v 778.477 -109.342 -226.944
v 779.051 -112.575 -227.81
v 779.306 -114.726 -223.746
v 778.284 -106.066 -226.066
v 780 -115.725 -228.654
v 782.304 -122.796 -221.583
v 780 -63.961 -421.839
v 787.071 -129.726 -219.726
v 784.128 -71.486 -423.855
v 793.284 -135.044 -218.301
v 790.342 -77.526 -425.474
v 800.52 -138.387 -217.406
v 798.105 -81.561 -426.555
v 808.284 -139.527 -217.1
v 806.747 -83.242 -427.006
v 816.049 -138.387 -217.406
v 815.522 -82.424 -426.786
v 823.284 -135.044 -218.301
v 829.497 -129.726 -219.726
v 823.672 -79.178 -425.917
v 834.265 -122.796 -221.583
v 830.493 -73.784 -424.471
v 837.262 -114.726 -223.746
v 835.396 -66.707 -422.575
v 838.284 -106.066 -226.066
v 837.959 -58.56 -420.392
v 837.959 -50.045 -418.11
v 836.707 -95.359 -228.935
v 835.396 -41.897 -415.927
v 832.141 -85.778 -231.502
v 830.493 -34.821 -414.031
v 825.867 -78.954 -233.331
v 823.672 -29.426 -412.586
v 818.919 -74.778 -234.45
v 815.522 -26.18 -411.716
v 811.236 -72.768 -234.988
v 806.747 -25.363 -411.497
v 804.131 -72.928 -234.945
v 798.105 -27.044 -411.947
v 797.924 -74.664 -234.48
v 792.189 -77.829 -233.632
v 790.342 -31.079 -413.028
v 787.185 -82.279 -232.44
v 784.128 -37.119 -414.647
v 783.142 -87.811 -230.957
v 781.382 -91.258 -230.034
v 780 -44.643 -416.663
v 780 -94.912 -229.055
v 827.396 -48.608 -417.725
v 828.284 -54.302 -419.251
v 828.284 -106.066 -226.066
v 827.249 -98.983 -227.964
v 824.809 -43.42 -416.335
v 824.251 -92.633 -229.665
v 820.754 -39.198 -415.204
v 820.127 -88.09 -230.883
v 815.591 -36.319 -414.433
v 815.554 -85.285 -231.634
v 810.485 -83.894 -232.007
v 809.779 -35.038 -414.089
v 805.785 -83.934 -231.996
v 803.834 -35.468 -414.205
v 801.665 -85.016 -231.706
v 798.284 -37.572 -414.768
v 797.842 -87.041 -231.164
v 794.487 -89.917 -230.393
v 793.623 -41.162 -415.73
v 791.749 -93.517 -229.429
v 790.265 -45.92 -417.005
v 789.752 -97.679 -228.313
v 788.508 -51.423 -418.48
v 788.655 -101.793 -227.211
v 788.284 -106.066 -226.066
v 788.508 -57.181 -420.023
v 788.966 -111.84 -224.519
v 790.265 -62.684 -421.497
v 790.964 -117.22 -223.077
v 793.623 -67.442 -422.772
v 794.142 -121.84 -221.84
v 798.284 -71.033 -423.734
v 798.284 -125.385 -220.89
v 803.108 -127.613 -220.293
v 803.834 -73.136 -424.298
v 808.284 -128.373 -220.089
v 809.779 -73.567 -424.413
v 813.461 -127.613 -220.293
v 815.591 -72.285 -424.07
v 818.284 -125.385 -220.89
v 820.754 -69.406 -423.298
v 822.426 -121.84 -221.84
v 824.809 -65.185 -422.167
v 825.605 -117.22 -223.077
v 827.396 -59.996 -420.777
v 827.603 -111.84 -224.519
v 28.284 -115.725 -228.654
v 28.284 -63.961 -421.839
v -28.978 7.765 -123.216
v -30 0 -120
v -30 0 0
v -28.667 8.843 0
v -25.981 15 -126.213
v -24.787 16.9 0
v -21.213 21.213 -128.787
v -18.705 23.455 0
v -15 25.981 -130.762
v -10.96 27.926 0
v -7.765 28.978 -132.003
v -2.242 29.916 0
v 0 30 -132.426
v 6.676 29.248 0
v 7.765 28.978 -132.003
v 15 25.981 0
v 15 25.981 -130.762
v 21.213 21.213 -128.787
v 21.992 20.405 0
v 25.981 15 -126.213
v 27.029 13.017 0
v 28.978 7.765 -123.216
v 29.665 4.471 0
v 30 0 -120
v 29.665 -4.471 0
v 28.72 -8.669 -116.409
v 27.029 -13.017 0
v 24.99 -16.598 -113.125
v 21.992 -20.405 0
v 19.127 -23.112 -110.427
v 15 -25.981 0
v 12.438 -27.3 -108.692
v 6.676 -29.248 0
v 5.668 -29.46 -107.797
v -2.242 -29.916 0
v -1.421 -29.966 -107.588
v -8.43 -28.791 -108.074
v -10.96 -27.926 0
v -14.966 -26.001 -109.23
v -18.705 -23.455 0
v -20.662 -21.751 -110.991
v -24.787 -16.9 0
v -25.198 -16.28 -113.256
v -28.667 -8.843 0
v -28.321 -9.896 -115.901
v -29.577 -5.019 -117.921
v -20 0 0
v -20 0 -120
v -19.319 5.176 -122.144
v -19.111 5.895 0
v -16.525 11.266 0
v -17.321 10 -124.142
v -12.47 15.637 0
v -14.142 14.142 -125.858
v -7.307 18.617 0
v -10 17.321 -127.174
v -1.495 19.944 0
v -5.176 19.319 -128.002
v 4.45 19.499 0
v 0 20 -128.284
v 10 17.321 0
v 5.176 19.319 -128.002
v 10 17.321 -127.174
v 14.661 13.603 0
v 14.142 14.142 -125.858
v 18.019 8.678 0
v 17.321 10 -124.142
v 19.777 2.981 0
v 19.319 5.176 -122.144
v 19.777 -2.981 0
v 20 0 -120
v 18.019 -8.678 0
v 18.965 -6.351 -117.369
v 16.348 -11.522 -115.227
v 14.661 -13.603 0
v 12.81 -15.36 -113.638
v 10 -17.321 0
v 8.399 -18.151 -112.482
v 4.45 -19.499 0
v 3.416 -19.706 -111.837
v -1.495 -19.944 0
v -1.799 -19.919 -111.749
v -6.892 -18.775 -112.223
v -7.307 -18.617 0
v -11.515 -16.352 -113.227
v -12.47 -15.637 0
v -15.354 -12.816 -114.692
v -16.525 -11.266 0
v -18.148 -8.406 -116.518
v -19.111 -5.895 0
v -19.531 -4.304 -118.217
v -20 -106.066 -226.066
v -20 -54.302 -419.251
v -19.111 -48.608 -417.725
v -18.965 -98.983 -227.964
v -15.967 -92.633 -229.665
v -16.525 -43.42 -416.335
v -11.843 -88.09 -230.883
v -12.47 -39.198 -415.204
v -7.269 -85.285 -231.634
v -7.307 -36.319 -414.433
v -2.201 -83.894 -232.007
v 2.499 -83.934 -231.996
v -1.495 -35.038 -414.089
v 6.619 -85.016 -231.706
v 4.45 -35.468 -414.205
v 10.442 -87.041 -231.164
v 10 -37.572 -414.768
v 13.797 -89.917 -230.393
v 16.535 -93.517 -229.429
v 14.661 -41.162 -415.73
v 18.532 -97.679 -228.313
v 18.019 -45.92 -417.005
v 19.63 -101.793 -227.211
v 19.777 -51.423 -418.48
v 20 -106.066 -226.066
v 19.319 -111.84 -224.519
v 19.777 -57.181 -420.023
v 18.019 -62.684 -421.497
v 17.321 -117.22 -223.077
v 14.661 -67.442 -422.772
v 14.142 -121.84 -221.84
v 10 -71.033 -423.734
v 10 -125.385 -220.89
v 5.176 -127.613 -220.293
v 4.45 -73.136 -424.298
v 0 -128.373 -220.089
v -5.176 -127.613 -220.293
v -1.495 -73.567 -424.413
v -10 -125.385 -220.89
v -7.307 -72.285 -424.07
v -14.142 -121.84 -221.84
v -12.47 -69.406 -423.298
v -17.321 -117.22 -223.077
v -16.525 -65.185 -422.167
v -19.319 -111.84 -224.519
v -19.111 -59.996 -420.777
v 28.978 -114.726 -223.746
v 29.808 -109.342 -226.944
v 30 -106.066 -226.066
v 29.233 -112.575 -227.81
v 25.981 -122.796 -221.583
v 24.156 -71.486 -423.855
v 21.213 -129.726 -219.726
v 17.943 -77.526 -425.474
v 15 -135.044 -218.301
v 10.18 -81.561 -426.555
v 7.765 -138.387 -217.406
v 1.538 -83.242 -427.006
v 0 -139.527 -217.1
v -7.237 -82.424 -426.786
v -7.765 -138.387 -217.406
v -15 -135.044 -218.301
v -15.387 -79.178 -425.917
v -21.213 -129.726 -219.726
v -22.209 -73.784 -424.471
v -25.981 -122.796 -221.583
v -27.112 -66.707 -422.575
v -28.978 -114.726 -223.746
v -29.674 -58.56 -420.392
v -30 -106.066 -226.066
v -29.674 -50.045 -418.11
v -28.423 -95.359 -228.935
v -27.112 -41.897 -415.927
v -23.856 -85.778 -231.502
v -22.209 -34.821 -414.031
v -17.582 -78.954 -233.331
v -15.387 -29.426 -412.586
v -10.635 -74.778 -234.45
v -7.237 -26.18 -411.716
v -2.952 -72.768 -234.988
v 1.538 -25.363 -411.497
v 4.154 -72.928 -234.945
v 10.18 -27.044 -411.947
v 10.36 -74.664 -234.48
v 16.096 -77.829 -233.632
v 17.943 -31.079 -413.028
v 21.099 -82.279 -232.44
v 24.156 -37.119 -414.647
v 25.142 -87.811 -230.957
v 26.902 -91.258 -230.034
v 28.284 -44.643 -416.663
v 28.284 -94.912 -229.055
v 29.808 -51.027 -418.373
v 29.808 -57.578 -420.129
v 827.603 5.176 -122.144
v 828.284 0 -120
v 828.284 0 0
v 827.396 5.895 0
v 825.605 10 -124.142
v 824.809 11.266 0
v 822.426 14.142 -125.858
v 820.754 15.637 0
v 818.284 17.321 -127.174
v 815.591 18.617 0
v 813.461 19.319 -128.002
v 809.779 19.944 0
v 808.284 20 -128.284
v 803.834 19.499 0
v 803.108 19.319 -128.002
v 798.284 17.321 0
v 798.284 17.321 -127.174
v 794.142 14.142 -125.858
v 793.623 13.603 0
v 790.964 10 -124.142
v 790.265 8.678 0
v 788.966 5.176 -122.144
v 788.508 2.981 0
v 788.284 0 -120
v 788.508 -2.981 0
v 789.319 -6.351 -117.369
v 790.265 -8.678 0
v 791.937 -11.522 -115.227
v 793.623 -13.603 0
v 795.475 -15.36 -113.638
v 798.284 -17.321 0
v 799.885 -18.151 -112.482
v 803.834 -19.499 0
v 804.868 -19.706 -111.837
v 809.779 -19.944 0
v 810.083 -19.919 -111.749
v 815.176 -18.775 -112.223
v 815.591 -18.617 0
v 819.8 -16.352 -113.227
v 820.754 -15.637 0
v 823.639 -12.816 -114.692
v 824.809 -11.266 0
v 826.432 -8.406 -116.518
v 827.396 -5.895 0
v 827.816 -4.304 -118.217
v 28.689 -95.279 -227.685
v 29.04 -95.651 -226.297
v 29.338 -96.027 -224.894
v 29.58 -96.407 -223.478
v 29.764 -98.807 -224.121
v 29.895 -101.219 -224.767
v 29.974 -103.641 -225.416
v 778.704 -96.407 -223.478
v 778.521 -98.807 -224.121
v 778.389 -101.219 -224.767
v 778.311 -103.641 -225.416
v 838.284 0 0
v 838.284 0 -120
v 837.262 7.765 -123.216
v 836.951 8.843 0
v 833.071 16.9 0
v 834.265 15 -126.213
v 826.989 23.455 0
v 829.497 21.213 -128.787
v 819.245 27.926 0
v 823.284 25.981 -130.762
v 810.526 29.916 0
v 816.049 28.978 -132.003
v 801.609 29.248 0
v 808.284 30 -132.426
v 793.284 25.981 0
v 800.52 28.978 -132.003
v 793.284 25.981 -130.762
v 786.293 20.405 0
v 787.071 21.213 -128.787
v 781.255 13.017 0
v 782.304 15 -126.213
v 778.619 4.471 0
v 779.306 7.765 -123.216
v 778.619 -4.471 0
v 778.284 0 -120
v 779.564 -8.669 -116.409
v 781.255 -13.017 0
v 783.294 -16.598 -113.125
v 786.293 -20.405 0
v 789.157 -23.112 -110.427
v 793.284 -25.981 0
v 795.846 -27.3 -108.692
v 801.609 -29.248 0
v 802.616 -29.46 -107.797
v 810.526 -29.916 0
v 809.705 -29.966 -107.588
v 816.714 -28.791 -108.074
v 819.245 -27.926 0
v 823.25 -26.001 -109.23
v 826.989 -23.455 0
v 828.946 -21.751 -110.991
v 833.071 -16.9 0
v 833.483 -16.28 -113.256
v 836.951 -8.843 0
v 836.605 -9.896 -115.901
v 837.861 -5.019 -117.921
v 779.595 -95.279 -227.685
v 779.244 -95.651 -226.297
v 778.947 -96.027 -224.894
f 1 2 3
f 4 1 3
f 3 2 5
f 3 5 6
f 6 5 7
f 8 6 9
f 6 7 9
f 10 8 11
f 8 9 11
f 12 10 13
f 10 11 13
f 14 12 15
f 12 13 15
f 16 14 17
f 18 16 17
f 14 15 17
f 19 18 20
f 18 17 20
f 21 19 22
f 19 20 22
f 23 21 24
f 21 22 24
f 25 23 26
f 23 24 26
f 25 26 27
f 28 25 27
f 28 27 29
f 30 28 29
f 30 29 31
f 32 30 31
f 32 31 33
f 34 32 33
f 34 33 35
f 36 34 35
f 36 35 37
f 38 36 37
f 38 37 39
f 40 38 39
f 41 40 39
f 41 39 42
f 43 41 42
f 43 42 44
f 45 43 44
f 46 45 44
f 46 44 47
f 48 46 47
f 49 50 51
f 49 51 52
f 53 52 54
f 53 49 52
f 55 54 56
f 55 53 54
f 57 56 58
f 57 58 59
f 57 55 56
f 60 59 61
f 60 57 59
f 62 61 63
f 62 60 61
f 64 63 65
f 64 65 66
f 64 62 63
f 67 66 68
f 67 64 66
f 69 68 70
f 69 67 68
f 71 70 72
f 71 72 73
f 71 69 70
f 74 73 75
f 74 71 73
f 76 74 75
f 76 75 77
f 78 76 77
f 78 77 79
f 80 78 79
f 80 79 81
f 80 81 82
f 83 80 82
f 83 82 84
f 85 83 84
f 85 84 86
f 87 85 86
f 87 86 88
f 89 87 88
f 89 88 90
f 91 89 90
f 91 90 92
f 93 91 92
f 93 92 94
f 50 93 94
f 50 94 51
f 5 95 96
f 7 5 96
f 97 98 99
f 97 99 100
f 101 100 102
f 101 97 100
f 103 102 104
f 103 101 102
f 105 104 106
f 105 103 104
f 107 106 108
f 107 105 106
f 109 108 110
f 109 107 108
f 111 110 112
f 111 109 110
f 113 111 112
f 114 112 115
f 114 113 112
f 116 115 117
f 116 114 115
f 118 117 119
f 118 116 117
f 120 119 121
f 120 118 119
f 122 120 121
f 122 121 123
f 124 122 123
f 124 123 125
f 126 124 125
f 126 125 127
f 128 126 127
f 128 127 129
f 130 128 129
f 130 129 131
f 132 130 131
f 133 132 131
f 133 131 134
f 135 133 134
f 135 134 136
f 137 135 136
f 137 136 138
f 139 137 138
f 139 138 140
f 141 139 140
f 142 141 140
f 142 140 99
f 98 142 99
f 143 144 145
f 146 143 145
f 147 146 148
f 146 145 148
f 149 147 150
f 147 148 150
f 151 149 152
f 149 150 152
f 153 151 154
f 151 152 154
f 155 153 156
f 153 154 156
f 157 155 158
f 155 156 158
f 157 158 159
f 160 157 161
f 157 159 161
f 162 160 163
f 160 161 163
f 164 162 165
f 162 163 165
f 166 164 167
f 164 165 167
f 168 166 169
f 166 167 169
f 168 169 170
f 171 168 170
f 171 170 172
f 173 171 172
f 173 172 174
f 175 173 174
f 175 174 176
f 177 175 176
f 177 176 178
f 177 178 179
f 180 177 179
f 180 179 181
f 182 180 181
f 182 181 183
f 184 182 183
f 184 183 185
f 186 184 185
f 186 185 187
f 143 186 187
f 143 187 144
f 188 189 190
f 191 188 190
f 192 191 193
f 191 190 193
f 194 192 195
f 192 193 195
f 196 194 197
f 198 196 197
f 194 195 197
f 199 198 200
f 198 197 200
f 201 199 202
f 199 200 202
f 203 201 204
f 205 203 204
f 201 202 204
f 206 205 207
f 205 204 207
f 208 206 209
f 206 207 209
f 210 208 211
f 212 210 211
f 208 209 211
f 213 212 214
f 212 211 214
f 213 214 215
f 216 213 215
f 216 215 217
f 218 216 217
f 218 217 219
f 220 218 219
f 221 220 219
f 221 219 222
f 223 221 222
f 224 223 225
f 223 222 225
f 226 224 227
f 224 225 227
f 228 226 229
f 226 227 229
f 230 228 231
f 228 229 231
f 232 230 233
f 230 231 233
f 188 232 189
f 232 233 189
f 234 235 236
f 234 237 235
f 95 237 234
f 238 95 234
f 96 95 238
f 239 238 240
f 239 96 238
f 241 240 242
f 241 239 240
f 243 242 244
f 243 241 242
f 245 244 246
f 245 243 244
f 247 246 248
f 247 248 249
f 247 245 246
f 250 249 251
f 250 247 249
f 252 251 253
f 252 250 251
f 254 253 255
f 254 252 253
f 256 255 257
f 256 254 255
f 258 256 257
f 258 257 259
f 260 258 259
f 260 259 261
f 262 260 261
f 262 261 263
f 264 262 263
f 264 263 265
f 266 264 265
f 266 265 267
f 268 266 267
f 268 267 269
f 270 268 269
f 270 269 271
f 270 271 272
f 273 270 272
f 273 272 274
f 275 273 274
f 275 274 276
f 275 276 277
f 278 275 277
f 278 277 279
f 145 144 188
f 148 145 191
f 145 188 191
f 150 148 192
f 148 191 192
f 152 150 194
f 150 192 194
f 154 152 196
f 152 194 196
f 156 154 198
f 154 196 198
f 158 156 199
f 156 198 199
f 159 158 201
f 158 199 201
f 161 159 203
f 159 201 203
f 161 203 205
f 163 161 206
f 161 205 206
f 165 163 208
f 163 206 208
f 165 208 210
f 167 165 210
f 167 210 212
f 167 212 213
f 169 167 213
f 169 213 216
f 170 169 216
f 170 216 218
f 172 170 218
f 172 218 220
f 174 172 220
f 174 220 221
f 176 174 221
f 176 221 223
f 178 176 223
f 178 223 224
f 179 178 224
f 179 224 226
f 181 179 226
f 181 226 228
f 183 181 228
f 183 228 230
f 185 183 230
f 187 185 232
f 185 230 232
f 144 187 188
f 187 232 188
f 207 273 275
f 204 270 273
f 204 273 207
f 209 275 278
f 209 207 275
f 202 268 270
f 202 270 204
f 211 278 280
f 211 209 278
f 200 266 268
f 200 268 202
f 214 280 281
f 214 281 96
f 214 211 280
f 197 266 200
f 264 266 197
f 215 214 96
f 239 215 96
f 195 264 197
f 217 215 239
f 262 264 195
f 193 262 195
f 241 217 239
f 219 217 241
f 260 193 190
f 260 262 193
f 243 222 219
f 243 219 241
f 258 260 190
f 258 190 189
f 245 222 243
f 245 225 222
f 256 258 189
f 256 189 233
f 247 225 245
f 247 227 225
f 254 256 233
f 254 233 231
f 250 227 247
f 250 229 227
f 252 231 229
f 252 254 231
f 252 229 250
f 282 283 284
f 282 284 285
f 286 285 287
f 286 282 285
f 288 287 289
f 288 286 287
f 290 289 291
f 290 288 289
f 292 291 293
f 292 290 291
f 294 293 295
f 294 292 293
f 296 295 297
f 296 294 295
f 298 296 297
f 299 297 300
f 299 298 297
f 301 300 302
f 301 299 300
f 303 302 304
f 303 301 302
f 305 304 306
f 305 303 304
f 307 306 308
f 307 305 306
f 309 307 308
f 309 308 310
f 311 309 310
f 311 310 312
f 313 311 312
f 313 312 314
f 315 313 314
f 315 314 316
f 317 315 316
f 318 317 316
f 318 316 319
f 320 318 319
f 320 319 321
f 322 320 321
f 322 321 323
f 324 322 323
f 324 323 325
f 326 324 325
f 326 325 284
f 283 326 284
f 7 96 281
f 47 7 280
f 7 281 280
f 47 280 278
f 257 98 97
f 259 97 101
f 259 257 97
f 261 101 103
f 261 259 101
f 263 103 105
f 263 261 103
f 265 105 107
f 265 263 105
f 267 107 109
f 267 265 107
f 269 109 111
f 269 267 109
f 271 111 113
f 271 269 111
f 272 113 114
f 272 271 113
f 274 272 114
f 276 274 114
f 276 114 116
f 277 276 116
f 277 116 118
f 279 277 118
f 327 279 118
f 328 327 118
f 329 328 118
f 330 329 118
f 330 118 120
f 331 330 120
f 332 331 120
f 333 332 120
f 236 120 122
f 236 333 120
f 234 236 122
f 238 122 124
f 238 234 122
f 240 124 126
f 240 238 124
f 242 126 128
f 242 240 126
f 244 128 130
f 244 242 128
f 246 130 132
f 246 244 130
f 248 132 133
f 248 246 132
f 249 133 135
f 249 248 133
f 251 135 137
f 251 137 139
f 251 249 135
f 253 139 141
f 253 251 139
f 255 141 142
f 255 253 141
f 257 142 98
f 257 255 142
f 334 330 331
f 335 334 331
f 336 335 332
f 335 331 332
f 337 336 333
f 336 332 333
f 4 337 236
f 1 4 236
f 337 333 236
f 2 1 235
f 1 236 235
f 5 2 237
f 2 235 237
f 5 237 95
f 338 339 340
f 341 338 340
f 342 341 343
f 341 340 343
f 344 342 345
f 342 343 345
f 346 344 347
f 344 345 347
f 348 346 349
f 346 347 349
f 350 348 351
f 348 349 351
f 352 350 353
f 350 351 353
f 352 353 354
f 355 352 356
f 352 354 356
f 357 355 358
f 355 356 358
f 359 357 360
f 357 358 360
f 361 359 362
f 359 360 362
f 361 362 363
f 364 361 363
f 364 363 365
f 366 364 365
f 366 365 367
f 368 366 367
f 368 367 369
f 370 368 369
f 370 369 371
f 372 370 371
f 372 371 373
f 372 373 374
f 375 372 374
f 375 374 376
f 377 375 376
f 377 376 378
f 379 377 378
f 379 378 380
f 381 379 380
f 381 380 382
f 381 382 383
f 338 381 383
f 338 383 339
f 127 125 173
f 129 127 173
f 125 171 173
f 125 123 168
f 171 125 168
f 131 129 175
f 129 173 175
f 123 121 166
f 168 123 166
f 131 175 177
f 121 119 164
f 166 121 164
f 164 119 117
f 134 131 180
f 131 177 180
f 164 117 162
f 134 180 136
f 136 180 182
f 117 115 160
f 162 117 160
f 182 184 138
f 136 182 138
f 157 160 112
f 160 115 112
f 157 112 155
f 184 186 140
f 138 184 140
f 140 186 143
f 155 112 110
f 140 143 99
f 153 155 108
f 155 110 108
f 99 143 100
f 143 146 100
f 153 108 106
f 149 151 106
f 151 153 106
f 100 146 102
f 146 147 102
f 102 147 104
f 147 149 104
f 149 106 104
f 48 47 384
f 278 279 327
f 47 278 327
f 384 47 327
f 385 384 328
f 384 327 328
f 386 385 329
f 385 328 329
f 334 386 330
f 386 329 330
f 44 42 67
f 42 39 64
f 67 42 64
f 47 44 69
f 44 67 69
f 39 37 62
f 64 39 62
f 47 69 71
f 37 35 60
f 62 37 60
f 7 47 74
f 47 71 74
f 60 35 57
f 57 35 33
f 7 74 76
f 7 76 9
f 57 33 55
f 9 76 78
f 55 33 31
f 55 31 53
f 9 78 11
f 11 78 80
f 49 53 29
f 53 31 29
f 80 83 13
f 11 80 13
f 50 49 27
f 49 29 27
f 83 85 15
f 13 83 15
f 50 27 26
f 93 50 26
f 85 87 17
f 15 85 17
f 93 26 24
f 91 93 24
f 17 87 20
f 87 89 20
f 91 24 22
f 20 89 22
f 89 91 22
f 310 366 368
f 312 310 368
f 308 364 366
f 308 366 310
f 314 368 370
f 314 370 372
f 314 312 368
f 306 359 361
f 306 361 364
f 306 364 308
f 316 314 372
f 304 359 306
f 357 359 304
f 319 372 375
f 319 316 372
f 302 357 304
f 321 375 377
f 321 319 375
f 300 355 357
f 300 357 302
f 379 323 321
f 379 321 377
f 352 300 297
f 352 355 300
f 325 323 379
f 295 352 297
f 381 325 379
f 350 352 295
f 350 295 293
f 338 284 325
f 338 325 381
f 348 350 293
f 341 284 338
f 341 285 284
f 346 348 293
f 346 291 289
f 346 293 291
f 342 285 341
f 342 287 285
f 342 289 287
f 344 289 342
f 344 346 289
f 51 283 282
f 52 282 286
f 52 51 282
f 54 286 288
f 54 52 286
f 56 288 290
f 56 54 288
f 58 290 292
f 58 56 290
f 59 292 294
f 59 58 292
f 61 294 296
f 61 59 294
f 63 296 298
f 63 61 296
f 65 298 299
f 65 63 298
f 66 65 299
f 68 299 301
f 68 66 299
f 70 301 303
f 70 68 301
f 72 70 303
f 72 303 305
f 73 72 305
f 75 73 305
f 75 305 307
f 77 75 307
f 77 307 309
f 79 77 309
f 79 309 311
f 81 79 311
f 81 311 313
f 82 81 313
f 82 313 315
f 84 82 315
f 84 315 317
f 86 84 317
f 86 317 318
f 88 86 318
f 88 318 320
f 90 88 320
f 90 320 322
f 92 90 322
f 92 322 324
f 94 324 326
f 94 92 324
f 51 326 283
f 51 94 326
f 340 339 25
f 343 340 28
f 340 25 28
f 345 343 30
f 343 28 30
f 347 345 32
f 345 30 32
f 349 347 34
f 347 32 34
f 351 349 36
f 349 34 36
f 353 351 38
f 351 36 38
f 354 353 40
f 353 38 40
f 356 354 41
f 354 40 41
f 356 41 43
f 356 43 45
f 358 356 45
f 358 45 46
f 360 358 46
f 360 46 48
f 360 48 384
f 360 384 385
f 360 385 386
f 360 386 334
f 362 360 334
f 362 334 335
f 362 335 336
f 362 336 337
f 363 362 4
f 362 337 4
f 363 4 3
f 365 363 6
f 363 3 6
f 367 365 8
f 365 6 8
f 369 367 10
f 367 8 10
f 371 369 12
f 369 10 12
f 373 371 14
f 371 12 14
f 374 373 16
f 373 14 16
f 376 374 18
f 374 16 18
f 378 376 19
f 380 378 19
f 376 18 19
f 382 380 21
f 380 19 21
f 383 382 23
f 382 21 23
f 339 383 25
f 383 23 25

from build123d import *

# Parameters (mm, degrees)
SWEEP_THIN1_PROFILE_R   = 30
SWEEP_THIN1_PROFILE_R_2 = 20
EXTRUDE_THIN1_START     = 20
EXTRUDE_THIN1_DEPTH     = 760


with BuildPart() as part:
    # Sweep-Thin1: sweep along a path in Sketch21
    with BuildLine(Plane(origin=(0, 0, 0), x_dir=(0, 0, -1), z_dir=(1, 0, 0))) as sweep_thin1_path:
        Line((0, 0), (120, 0))
        Line((120, 0), (226.066017178, -106.066017178))
        Line((226.066017178, -106.066017178), (419.251182436, -54.302208157))
    # Sweep-Thin1 profile (on start of the path) → Sweep-Thin1 (sweep)
    with BuildSketch(Plane(origin=(0, 0, 0), x_dir=(-1, 0, 0), z_dir=(0, 0, -1))):
        Circle(SWEEP_THIN1_PROFILE_R)
        Circle(SWEEP_THIN1_PROFILE_R_2, mode=Mode.SUBTRACT)
    sweep_thin1 = sweep(path=sweep_thin1_path.line, transition=Transition.RIGHT)

    # Sketch32 → Extrude-Thin1 (add)
    with BuildSketch(Plane(origin=(0, 0, 0), x_dir=(0, 0, -1), z_dir=(1, 0, 0)).offset(EXTRUDE_THIN1_START)):
        Polygon((228.654207629, -115.725275441), (421.839372887, -63.96146642), (416.662991985, -44.642949895), (223.477826727, -96.406758915), align=None)
    extrude(amount=EXTRUDE_THIN1_DEPTH)

    # Mirror1: Sweep-Thin1 across plane
    add(sweep_thin1.mirror(Plane(origin=(404.142135624, 0, 0), x_dir=(0, 0, 1), z_dir=(1, 0, 0))))


solid = part.part
